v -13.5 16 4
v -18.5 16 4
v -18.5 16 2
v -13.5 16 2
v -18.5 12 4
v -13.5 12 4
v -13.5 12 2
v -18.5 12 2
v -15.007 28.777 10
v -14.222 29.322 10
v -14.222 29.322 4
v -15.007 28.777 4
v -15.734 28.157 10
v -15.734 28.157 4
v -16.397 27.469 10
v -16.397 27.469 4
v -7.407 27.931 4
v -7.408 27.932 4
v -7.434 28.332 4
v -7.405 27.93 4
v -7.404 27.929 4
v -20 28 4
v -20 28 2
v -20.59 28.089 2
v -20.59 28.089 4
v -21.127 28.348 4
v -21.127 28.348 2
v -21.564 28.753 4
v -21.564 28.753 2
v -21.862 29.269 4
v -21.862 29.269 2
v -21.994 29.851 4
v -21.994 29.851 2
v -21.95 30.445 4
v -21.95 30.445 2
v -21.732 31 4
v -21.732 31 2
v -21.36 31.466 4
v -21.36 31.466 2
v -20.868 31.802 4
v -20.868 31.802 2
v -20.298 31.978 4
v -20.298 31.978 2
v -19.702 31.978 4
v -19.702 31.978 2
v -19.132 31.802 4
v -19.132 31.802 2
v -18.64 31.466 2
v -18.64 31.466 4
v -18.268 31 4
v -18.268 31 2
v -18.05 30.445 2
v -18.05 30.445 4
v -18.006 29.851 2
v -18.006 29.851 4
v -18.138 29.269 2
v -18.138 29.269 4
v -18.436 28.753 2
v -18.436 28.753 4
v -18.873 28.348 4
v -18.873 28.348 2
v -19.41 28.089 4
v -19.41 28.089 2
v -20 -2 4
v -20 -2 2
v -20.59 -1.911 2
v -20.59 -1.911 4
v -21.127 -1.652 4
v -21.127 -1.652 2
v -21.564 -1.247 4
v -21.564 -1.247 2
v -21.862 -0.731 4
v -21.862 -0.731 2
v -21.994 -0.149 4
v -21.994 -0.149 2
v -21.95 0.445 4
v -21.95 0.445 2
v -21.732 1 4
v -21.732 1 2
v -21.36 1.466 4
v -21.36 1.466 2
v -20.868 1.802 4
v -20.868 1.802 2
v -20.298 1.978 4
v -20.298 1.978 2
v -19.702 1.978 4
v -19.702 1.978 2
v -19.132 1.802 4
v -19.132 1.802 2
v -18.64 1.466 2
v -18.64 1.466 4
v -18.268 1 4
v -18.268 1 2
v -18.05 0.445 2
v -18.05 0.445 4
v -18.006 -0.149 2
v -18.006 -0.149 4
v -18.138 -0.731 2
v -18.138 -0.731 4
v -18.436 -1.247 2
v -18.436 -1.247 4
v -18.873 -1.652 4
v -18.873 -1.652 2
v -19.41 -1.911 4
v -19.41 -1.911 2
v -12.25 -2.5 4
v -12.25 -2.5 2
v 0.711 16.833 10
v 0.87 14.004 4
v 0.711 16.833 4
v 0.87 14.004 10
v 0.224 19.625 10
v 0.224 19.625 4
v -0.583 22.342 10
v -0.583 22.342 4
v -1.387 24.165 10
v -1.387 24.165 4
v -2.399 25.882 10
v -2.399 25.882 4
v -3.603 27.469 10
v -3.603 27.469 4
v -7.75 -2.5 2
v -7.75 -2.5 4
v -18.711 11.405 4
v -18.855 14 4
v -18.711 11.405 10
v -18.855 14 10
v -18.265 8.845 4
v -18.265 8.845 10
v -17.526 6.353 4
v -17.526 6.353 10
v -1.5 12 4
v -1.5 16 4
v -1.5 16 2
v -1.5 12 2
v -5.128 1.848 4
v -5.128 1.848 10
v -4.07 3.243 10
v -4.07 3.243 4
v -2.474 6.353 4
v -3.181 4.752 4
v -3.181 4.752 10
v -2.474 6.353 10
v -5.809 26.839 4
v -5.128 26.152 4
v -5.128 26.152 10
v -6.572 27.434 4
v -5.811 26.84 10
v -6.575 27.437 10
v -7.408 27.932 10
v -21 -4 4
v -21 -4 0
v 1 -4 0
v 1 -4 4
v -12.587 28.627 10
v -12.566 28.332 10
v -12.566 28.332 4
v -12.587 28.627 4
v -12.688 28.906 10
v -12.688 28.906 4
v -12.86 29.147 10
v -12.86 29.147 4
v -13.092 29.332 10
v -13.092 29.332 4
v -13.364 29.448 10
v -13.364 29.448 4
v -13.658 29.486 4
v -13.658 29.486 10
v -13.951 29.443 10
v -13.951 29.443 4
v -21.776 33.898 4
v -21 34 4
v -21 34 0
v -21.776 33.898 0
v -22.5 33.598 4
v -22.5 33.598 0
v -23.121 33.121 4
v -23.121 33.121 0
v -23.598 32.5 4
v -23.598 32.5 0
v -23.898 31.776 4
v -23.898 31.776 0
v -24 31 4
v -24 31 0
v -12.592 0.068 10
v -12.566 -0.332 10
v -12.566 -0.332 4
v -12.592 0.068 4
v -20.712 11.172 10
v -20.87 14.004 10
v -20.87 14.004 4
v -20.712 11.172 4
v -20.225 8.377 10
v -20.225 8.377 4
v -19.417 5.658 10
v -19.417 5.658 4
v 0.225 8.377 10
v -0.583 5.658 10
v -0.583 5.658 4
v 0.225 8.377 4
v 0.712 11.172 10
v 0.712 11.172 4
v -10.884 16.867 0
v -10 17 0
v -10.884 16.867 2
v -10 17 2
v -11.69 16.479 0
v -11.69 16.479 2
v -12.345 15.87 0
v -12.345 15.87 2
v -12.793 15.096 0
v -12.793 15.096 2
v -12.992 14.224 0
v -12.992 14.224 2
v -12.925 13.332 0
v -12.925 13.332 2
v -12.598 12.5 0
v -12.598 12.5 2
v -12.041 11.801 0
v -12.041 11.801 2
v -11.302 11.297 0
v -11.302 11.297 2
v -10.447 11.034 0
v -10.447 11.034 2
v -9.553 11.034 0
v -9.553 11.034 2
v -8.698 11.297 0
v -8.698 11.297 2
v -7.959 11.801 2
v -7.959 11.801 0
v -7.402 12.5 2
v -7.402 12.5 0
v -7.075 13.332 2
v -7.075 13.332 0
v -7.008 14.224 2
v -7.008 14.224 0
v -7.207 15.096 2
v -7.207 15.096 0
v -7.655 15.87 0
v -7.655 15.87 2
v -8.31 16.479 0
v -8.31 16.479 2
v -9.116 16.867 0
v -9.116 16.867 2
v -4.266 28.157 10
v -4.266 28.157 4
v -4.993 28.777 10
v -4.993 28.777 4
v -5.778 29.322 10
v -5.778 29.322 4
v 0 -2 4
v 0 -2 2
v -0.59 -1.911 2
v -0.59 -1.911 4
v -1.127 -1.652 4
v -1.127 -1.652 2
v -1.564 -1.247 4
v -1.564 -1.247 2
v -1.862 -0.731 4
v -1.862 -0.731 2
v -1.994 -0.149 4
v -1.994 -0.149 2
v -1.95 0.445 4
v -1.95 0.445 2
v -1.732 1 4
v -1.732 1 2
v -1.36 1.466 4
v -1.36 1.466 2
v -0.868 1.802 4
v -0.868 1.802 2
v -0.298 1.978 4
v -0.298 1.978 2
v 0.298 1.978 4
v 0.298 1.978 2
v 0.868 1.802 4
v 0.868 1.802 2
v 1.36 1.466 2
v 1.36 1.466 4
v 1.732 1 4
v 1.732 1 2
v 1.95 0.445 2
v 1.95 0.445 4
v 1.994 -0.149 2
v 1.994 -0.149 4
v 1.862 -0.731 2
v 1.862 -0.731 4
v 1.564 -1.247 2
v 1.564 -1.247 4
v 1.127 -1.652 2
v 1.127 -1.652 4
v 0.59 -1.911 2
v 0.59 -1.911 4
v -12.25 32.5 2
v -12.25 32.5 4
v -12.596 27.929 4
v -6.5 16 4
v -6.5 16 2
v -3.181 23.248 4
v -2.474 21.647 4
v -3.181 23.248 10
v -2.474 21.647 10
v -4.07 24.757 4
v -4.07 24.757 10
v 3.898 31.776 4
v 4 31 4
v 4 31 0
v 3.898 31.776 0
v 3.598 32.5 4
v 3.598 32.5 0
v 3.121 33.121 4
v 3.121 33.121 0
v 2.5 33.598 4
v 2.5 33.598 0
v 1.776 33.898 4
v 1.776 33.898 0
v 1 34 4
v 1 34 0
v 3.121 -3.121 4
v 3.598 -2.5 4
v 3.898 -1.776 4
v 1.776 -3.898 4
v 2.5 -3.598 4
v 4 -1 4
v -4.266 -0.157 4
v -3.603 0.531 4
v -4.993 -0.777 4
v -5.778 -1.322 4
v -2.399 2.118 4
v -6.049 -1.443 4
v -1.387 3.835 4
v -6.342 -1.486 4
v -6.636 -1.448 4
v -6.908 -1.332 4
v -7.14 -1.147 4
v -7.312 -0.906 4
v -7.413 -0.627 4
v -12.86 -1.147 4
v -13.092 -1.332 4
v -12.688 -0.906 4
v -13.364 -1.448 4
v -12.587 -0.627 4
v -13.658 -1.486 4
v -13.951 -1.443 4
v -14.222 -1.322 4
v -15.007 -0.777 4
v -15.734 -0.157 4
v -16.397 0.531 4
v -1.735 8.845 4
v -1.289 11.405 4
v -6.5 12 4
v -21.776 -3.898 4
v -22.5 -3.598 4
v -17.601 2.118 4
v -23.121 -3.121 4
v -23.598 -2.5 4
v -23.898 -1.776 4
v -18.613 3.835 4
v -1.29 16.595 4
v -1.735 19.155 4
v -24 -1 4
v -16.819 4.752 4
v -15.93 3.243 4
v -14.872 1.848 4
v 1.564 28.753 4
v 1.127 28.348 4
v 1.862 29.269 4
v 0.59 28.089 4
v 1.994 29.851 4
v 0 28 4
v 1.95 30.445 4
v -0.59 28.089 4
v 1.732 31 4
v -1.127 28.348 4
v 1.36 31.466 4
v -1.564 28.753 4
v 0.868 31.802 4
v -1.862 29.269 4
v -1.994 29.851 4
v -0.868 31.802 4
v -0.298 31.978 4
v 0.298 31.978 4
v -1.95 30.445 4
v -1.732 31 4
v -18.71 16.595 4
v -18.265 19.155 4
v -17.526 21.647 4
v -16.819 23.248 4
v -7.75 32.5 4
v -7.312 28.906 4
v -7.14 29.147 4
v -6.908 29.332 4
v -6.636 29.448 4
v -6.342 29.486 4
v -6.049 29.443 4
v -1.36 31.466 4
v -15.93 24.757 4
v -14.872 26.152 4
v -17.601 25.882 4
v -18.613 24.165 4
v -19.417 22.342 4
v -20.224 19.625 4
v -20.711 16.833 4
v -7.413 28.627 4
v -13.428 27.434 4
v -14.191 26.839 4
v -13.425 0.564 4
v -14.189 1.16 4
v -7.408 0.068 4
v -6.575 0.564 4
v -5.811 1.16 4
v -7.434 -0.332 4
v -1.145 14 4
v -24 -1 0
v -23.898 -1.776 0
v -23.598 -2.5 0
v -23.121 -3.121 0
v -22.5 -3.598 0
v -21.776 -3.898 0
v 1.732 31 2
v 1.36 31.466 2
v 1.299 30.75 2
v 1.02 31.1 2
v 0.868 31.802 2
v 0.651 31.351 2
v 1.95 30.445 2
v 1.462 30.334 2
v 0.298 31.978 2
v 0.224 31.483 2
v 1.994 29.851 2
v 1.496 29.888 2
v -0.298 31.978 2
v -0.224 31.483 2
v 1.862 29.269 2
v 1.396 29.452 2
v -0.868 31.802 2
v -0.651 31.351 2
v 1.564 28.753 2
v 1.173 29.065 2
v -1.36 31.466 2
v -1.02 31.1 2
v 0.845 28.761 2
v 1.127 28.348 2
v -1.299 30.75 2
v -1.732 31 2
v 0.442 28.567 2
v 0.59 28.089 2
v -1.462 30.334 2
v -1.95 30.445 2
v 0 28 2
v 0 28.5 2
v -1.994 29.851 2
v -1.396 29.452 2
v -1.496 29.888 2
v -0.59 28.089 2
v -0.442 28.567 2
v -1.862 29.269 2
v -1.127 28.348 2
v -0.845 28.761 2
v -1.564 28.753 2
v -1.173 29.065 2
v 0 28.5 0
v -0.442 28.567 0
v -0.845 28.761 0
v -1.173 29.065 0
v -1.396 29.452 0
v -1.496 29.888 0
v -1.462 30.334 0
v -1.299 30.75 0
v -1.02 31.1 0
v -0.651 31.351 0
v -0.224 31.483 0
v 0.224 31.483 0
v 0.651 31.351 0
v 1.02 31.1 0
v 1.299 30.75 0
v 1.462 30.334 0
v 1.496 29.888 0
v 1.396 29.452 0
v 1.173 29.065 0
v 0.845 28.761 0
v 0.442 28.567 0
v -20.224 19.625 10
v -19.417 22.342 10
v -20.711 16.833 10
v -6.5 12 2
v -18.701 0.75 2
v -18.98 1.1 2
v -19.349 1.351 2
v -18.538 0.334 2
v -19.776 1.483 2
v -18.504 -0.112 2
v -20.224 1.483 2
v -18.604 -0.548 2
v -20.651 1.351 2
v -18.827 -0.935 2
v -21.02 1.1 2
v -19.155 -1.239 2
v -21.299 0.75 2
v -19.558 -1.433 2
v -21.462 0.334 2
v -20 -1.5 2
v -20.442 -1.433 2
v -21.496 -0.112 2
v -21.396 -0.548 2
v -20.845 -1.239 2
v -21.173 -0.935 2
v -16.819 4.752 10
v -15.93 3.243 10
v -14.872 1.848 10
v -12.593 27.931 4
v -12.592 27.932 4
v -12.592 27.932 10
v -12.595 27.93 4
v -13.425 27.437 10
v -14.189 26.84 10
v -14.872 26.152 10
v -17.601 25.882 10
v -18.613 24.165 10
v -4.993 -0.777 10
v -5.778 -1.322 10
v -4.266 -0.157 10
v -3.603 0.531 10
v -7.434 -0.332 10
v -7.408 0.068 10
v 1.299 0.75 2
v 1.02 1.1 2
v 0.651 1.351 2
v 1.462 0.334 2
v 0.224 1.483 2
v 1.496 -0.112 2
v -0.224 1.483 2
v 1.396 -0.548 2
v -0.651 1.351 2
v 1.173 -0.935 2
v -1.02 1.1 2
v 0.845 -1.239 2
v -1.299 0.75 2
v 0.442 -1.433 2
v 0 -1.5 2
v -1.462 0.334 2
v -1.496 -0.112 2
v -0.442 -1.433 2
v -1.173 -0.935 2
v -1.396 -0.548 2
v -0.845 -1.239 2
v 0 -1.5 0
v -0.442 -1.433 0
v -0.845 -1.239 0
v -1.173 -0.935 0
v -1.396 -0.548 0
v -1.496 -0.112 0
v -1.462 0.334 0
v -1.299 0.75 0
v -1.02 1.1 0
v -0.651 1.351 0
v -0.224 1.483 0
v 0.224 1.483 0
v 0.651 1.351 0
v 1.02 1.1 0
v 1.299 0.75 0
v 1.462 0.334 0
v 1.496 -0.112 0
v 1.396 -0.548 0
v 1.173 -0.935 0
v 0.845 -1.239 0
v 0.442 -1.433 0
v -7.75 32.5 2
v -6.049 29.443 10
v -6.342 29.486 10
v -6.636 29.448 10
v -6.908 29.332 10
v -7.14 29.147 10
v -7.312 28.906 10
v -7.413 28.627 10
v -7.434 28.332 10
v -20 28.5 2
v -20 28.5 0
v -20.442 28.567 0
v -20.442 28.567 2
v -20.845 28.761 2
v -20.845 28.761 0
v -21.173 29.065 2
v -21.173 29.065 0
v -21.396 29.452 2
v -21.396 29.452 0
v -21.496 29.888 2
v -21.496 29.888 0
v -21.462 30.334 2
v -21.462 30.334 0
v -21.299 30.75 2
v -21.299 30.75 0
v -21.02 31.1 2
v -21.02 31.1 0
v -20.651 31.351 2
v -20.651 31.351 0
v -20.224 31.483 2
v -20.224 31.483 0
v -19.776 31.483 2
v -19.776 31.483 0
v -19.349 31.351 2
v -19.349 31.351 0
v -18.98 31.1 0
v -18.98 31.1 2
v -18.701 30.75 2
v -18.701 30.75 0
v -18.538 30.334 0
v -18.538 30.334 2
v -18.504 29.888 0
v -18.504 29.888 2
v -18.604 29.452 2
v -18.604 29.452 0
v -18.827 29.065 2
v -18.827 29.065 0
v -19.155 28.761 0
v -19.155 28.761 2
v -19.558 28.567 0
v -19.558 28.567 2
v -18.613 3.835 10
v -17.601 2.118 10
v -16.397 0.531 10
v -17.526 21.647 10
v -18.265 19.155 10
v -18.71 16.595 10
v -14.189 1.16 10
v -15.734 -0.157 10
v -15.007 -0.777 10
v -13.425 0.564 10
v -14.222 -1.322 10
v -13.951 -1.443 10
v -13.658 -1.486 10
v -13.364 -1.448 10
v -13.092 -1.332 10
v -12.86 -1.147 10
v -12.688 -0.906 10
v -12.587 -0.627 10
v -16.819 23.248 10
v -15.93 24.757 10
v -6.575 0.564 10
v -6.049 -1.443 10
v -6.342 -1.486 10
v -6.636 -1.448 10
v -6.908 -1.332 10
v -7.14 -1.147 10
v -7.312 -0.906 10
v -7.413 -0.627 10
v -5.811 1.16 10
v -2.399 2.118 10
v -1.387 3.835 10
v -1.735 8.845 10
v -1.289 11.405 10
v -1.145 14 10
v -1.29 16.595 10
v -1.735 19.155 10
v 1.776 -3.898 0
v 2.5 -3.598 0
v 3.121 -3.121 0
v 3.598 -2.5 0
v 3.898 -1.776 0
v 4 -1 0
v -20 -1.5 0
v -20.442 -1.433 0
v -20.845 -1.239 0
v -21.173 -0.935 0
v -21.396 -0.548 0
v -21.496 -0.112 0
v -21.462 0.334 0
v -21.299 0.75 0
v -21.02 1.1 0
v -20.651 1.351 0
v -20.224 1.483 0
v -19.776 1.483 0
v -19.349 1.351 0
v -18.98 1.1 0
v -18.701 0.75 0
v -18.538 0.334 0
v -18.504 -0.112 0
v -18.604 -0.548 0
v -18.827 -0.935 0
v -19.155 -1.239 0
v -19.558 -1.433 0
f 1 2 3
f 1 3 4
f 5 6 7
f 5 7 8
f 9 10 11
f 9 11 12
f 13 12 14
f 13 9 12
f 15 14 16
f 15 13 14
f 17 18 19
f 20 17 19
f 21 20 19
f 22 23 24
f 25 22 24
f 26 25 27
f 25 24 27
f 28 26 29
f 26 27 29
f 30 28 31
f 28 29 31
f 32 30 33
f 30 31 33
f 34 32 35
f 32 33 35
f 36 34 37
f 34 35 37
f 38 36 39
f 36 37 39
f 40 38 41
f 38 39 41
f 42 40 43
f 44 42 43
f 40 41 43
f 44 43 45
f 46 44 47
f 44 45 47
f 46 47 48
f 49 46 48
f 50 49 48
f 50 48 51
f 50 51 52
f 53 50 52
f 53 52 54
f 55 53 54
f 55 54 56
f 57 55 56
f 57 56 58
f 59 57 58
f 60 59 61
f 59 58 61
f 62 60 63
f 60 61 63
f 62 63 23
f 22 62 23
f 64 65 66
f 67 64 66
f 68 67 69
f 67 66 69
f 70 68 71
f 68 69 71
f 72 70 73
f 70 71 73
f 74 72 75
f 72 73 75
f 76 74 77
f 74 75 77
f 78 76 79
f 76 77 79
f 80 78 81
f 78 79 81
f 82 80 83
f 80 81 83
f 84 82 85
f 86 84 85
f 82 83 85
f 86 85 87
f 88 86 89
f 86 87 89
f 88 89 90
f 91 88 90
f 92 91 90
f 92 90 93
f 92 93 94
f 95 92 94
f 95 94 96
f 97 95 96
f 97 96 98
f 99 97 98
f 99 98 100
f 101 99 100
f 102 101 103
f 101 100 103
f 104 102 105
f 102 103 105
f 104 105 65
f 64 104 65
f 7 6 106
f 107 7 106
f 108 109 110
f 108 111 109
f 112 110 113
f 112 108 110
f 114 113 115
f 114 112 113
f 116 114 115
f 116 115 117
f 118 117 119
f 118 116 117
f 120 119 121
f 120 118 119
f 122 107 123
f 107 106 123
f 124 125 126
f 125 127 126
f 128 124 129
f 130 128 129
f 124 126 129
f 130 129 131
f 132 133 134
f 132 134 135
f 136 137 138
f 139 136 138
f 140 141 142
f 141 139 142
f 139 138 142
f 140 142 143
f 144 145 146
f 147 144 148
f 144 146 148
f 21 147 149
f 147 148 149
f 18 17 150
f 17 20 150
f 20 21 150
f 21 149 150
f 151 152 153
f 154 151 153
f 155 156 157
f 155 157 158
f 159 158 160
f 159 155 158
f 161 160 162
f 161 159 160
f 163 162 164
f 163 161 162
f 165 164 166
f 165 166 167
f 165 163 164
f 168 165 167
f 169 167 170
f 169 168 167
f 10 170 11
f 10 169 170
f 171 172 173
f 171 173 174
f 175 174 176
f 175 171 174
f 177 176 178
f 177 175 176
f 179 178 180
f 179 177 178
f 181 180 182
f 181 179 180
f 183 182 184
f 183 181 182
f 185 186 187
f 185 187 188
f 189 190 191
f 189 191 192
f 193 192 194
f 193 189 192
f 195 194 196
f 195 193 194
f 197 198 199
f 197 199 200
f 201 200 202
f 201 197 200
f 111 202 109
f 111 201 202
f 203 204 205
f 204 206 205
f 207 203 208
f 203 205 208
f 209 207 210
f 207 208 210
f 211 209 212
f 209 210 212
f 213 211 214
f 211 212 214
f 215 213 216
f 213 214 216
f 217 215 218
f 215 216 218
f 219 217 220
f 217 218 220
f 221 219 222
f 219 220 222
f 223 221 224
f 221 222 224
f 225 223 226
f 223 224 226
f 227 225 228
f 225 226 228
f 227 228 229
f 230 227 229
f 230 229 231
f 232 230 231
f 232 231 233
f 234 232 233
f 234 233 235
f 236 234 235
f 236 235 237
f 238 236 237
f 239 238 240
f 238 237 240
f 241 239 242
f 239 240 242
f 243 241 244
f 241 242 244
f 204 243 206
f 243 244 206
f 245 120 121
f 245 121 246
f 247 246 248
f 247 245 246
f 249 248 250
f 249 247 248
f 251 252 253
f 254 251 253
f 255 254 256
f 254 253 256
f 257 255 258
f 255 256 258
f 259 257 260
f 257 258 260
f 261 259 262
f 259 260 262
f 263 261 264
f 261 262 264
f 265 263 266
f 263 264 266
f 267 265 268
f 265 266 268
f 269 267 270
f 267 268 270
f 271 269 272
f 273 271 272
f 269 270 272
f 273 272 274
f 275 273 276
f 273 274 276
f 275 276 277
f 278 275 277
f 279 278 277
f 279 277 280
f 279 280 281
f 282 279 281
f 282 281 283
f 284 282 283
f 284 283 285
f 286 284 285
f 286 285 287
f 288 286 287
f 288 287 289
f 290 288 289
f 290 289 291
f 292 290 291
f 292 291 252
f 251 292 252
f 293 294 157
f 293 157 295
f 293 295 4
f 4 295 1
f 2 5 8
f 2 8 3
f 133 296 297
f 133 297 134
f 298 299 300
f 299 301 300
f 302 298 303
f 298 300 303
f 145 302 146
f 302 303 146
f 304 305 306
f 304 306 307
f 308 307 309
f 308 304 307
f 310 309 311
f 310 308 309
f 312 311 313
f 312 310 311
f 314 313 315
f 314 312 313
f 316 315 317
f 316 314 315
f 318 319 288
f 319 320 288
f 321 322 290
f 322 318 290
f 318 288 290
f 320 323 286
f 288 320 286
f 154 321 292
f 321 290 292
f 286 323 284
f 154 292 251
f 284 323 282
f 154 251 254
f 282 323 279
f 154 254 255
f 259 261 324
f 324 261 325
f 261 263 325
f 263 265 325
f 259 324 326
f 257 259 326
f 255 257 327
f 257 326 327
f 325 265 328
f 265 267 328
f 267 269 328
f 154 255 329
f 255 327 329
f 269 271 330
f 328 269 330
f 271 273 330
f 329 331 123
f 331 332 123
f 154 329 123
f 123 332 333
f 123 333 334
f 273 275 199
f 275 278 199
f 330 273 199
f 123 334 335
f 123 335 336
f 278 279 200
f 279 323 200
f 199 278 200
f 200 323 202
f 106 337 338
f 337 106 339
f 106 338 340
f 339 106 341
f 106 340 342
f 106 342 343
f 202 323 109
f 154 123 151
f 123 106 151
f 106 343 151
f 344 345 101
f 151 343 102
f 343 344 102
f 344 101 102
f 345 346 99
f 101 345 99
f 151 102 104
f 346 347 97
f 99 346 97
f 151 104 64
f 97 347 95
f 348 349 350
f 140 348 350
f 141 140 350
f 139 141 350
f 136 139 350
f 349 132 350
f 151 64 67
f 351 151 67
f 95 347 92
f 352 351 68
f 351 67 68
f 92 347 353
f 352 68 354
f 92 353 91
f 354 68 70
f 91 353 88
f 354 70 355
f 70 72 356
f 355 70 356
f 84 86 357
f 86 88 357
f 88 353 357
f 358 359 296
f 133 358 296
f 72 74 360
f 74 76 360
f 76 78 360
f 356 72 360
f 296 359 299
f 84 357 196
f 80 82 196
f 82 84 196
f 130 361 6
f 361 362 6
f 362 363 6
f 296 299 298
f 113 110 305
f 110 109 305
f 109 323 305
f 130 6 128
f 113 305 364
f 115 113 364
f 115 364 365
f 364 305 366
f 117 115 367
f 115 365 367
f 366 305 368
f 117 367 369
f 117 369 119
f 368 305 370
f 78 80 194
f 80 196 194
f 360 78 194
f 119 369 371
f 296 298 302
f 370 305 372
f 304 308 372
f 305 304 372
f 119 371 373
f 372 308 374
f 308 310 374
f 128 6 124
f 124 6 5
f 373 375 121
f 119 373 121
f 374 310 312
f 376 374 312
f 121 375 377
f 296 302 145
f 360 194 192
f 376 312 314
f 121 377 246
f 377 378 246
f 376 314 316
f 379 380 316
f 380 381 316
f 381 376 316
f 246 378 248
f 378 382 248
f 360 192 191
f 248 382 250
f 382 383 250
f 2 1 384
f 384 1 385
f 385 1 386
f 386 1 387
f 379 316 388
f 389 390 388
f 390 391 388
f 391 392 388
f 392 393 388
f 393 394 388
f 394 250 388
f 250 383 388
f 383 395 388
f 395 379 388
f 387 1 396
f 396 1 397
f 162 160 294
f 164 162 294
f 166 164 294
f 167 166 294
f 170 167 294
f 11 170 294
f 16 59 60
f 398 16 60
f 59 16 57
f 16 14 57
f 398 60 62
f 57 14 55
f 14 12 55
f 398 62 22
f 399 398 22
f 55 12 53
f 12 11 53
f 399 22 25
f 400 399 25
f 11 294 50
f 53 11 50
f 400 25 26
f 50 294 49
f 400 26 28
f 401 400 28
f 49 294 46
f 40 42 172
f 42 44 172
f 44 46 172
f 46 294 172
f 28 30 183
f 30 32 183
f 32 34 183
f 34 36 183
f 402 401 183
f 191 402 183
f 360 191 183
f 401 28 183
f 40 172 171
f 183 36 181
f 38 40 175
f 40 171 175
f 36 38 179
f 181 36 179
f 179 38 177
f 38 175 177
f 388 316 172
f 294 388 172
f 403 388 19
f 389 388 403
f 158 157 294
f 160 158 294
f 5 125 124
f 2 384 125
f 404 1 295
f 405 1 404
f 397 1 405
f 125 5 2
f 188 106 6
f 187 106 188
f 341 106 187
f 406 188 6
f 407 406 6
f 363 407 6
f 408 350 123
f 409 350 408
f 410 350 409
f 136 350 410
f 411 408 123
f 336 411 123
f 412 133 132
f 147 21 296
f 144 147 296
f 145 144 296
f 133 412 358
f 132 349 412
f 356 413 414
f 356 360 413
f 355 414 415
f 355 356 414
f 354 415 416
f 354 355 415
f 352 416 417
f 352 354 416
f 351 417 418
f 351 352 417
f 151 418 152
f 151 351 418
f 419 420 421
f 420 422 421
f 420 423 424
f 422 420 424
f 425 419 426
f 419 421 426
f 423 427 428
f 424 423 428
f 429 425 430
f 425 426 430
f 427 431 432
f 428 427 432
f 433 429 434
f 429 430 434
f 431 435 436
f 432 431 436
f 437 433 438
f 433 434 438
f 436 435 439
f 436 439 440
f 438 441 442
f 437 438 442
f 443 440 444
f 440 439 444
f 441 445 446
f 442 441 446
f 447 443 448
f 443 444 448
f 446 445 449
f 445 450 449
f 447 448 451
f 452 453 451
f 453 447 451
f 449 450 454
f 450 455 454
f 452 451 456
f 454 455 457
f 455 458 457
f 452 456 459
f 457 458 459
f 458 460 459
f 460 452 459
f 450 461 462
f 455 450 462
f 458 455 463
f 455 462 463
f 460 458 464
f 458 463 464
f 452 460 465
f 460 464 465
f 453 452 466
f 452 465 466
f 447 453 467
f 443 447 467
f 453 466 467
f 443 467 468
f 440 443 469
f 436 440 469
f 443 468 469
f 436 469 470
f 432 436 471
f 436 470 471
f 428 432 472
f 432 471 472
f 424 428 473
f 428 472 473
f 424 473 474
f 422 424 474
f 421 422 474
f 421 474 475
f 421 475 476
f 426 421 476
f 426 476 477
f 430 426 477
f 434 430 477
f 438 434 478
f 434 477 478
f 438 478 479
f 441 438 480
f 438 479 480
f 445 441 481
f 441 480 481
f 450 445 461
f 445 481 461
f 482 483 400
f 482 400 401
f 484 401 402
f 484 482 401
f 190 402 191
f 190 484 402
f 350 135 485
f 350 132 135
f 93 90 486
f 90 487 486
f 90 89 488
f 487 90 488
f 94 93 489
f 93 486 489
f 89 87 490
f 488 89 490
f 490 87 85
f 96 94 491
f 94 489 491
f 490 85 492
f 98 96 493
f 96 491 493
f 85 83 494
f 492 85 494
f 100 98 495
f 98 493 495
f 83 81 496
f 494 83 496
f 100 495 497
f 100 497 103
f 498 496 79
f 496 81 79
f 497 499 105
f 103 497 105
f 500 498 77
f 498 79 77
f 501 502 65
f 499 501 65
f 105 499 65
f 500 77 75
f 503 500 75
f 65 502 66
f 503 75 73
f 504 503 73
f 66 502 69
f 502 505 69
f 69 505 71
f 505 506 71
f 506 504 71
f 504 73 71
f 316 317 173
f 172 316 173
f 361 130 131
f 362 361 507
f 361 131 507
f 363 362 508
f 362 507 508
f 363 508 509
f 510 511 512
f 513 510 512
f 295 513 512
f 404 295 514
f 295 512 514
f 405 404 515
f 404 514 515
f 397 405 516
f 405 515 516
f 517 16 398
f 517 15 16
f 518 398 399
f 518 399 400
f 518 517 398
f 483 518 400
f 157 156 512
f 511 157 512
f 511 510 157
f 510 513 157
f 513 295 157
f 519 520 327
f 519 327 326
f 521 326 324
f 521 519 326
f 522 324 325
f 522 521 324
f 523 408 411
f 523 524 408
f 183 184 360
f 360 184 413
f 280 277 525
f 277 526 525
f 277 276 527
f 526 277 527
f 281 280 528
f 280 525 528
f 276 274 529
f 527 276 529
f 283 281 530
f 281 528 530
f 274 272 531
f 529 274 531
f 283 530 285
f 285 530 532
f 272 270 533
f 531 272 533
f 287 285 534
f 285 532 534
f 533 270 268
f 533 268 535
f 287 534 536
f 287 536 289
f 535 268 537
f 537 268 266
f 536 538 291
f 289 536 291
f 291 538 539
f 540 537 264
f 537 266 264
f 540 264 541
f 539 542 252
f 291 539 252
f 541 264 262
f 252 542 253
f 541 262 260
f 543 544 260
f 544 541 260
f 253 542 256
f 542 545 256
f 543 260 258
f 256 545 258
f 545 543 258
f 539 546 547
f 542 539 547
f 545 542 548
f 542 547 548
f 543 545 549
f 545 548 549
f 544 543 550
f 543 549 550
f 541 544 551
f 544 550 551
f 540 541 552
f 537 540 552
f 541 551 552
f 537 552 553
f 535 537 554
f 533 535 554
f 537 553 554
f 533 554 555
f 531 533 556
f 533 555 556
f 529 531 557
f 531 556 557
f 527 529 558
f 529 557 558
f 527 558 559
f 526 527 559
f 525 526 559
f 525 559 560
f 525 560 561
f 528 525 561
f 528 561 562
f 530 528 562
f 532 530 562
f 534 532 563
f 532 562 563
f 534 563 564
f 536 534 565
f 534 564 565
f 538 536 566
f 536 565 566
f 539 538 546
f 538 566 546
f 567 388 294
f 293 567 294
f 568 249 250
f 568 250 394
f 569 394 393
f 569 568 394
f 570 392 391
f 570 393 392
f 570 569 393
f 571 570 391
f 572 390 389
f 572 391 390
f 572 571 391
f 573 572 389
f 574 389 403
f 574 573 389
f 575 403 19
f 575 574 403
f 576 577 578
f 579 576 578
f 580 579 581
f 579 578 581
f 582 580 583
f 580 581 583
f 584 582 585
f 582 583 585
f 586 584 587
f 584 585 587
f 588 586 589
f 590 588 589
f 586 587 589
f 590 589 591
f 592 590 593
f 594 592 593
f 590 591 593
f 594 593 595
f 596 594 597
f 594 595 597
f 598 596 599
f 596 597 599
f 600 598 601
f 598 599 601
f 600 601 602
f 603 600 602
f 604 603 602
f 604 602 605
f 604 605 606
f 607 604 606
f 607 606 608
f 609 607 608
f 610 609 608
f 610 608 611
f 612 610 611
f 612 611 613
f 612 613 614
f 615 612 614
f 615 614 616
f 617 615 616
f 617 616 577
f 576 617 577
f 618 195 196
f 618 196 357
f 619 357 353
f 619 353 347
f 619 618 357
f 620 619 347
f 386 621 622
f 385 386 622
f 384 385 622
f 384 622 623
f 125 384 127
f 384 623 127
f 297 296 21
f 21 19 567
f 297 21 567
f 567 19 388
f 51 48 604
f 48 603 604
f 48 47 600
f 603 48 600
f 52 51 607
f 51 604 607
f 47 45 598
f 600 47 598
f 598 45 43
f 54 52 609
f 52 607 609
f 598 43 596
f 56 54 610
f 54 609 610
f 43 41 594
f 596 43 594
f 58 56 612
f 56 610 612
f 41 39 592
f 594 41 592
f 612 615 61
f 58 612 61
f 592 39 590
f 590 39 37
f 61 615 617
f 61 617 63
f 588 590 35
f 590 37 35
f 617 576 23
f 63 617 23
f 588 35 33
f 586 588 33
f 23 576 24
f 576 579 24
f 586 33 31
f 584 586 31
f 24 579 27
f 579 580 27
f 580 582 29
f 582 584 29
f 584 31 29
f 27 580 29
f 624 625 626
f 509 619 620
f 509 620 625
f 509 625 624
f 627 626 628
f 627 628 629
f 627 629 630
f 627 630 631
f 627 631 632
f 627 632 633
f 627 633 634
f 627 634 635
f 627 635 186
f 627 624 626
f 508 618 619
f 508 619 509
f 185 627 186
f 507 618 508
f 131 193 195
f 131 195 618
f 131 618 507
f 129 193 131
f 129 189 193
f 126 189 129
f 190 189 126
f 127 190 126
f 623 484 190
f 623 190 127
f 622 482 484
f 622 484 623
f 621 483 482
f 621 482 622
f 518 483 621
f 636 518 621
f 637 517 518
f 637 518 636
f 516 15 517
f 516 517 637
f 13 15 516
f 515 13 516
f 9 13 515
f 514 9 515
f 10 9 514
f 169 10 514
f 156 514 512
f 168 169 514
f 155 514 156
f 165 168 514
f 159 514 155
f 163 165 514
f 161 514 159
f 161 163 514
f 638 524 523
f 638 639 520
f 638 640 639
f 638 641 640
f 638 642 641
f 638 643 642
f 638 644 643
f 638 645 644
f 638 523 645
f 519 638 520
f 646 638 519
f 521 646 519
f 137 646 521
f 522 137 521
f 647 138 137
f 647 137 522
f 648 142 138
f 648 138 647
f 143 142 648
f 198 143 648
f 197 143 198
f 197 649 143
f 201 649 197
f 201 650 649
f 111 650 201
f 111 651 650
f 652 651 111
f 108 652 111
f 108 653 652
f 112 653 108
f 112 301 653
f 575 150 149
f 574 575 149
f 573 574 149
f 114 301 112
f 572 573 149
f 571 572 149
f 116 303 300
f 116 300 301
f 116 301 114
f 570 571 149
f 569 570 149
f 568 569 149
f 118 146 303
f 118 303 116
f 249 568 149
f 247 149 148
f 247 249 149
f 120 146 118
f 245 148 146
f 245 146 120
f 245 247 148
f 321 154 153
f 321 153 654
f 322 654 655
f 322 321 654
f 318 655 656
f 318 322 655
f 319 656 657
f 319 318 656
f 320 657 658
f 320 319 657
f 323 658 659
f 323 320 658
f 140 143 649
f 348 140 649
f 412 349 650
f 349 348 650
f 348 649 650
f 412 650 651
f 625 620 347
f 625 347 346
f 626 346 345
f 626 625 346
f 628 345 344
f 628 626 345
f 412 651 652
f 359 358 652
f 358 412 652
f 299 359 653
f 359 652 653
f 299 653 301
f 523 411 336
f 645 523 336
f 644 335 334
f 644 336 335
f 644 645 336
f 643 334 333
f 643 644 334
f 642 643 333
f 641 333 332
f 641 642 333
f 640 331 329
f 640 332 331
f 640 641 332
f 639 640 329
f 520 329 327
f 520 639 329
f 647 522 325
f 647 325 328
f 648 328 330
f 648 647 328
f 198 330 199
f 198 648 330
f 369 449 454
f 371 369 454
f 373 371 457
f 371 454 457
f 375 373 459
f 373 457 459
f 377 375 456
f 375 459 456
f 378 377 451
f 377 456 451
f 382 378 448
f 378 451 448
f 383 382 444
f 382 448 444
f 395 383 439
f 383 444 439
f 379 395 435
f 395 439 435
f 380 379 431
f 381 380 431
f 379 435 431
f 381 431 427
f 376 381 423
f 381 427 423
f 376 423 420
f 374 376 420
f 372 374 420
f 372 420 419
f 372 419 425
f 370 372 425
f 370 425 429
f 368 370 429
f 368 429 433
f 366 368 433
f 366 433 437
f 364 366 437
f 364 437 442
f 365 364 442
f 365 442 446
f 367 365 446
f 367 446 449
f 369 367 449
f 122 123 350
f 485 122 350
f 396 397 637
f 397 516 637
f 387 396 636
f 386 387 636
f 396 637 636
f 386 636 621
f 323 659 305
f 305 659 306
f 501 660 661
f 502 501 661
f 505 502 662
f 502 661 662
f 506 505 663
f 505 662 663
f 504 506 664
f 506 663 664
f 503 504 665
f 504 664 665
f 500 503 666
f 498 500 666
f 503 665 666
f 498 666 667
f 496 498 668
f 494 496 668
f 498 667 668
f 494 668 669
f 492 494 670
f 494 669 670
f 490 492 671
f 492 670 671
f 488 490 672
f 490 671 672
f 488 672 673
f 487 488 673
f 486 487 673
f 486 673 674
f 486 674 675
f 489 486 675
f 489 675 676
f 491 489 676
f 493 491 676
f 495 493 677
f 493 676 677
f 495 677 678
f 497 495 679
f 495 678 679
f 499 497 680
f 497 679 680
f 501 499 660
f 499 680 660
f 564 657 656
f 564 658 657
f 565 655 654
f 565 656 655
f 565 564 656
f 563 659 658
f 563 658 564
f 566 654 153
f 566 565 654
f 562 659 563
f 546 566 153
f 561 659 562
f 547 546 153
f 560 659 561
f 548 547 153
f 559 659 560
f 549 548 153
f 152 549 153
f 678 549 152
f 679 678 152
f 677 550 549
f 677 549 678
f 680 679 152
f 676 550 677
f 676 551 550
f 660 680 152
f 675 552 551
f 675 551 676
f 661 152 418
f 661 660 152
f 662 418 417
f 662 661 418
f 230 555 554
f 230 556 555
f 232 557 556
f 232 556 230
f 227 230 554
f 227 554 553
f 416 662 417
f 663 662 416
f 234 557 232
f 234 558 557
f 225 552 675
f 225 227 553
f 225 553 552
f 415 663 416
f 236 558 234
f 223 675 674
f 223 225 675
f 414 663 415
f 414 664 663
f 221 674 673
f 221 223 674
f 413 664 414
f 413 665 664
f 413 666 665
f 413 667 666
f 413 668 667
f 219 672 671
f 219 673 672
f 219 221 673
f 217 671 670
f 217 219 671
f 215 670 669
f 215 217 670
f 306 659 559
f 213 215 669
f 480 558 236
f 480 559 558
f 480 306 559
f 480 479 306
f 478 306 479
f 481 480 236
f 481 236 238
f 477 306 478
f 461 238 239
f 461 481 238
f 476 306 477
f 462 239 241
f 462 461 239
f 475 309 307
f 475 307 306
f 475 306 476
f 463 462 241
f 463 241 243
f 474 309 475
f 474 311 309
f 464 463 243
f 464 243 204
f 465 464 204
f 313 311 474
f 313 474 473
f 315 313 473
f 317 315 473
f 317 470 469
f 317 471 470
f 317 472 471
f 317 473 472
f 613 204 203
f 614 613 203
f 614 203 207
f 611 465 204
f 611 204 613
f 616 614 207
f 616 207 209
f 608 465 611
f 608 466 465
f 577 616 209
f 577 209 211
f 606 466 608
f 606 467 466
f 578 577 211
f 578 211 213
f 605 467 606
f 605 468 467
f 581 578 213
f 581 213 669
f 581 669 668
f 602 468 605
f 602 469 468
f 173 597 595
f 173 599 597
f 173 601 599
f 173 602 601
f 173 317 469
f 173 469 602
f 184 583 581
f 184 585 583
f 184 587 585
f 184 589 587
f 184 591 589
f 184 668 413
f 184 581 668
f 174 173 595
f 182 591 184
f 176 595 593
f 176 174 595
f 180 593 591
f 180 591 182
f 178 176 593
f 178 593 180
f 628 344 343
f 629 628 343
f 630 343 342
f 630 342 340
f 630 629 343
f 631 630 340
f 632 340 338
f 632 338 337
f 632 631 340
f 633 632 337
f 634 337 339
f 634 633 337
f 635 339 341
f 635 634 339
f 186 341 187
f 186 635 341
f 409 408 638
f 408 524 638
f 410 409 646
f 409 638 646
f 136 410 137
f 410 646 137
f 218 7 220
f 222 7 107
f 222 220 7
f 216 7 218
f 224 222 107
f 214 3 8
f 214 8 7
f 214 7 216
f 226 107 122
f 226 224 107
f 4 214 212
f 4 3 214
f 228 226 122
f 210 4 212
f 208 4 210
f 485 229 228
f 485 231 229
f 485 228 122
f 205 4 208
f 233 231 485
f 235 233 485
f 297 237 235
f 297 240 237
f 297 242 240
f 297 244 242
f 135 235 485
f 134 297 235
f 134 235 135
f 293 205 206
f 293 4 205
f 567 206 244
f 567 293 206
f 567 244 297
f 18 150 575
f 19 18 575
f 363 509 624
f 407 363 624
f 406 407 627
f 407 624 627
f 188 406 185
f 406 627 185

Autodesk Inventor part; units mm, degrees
ref_plane "YZ Plane" through (0, 0, 0) normal (1, 0, 0) x (0, 1, 0)
ref_plane "XZ Plane" through (0, 0, 0) normal (0, 1, 0) x (-1, 0, 0)
sketch "Boceto5" plane through (-24, -1, 0) normal (0, 0, -1) x (-1, 0, 0)
  line L0 (-28, 35) -> (0, 35)
  line L1 (0, 35) -> (0, -3)
  line L2 (0, -3) -> (-28, -3)
  line L3 (-28, -3) -> (-28, 35)
  point P0 (-24, 1)
  point P1 (0, 0)
  dimension "d3" = 28
  dimension "d4" = 3
  dimension "d5" = 35
extrude "Extrusión2" add sketch "Boceto5" against normal blind 4
fillet "Empalme1" radius 3 4 edges at (-24, -4, 2) (4, -4, 2) (4, 34, 2) (-24, 34, 2)
sketch "Boceto6" plane through (-24, -1, 4) normal (0, 0, 1) x (1, 0, 0)
  line L0 (25, 35) -> (3, 35) construction
  line L1 (0, 32) -> (0, 0) construction
  point P0 (24, 1)
  point P1 (4, 31)
  dimension "d9" = 4
  dimension "d10" = 4
hole "Agujero1" at (-20, 30, 4) direction (0, 0, -1) diameter 3 end through all counterbore diameter 4 counterbore depth 2
pattern_linear "Patrón rectangular1" count 2 spacing 20 along (1, 0, 0) count 2 spacing 30 along (0, -1, 0) of "Agujero1"
sketch "Boceto7" plane through (-24, -1, 0) normal (0, 0, -1) x (-1, 0, 0)
  line L0 (-3, 35) -> (-25, 35) projected
  line L1 (-28, 32) -> (-28, 0) projected
  point P0 (-24, 1)
  point P1 (-14, 15)
  dimension "d24" = 20
  dimension "d25" = 14
hole "Agujero2" at (-10, 14, 0) direction (0, 0, 1) diameter 6 end through all
sketch "Boceto8" plane through (-24, -1, 4) normal (0, 0, 1) x (1, 0, 0)
  line L0 (5.5, 17) -> (22.5, 17)
  line L1 (22.5, 17) -> (22.5, 13)
  line L2 (22.5, 13) -> (5.5, 13)
  line L3 (5.5, 13) -> (5.5, 17)
  circle A0 centre (14, 15) radius 3 projected
  line L4 (5.5, 17) -> (22.5, 13) construction
  line L5 (22.5, 17) -> (5.5, 13) construction
  point P0 (24, 1)
  point P1 (11.7639, 13)
  point P2 (11.7639, 17)
  point P3 (16.2361, 17)
  point P4 (16.2361, 13)
  dimension "d33" = 17
  dimension "d34" = 4
extrude "Extrusión3" cut sketch "Boceto8" against normal blind 2 contours L0 A0 L2 L3 | L0 L1 L2 A0
sketch "Boceto9" plane through (-24, -1, 4) normal (0, 0, 1) x (1, 0, 0)
  line L0 (11.7639, 13) -> (5.5, 13) construction
  line L1 (10.5, 13) -> (11.75, -1.5)
  line L2 (11.75, -1.5) -> (16.25, -1.5)
  line L3 (16.25, -1.5) -> (17.5, 13)
  line L4 (17.5, 13) -> (10.5, 13)
  line L5 (0, 32) -> (0, 0) projected
  point P0 (24, 1)
  dimension "d37" = 14.5
  dimension "d38" = 4.5
  dimension "d39" = 10.5
  dimension "d40" = 7
  dimension "d41" = 1.25
extrude "Extrusión4" cut sketch "Boceto9" against normal blind 2
sketch "Boceto11" plane through (-24, -1, 4) normal (0, 0, 1) x (1, 0, 0)
  line L0 (5.5, 17) -> (11.7639, 17) construction
  line L1 (10.5, 17) -> (17.5, 17)
  line L2 (17.5, 17) -> (16.25, 33.5)
  line L3 (16.25, 33.5) -> (11.75, 33.5)
  line L4 (11.75, 33.5) -> (10.5, 17)
  point P0 (24, 1)
  dimension "d44" = 16.5
  dimension "d46" = 5
  dimension "d47" = 1.25
  dimension "d48" = 7
extrude "Extrusión5" cut sketch "Boceto11" against normal blind 2
sketch "Boceto15" plane through (-13.8306, 0.9703, 10) normal (0, 0, 1) x (1, 0, 0)
  circle A0 centre (17.3236, 13.0832) radius 22.3484 construction
  circle A1 centre (4.7289, 20.1353) radius 7.5795 construction
  circle A2 centre (10.4075, 15.4052) radius 15.0152 construction
  arc A3 (-3.6953, 20.6765) -> (-5.0248, 13.0297) centre (17.3236, 13.0832) ccw
  arc A4 (-1.0419, 25.1821) -> (-3.6953, 20.6765) centre (10.4075, 15.4052) ccw
  arc A5 (1.2391, 26.9612) -> (-1.0419, 25.1821) centre (4.7289, 20.1353) ccw
  circle A6 centre (3.8306, 13.0297) radius 3 construction
  line L0 (3.8306, 13.0297) -> (-5.0248, 13.0297) construction
  line L1 (3.8306, 11.0151) -> (-6.9515, 11.0151) construction
  arc A7 (-5.5863, 21.3713) -> (-6.9515, 11.0151) centre (17.3236, 13.0832) ccw
  arc A8 (-2.5664, 26.4991) -> (-5.5863, 21.3713) centre (10.4075, 15.4052) ccw
  arc A9 (-0.3913, 28.3513) -> (-2.5664, 26.4991) centre (4.7289, 20.1353) ccw
  line L2 (0.3306, 15.0297) -> (1.5806, 31.5297) construction
  arc A10 (1.2648, 27.3612) -> (-0.3913, 28.3513) centre (0.1824, 27.4308) ccw
  line L3 (1.2648, 27.3612) -> (1.2391, 26.9612)
  arc A11 (-5.0248, 13.0297) -> (-3.6953, 5.3829) centre (17.3236, 12.9762) ccw
  arc A12 (-3.6953, 5.3829) -> (-1.0419, 0.8774) centre (10.4075, 10.6542) ccw
  arc A13 (-1.0419, 0.8774) -> (1.2391, -0.9018) centre (4.7289, 5.9242) ccw
  line L4 (3.8306, 15.0443) -> (-6.9515, 15.0443) construction
  arc A14 (-6.9515, 15.0443) -> (-5.5863, 4.6881) centre (17.3236, 12.9762) ccw
  arc A15 (-5.5863, 4.6881) -> (-2.5664, -0.4397) centre (10.4075, 10.6542) ccw
  arc A16 (-2.5664, -0.4397) -> (-0.3913, -2.2919) centre (4.7289, 5.9242) ccw
  arc A17 (-0.3913, -2.2919) -> (1.2648, -1.3018) centre (0.1824, -1.3713) ccw
  line L5 (1.2648, -1.3018) -> (1.2391, -0.9018)
  point P0 (13.8306, -0.9703)
  point P1 (0.3306, 11.0297)
  point P2 (-7.0394, 13.0297)
  dimension "d51" = 20
  dimension "d52" = 20
  dimension "d53" = 21.75
  dimension "d55" = 1.9267
  dimension "d56" = 0.4
extrude "Extrusión6" add sketch "Boceto15" against normal blind 6
ref_plane "Plano de trabajo2" through (-10, 12, 4) normal (1, 0, 0) x (0, 0, -1)
mirror "Simetría2" about plane through (-10, 12, 4) normal (1, 0, 0) of "Extrusión6"
properties part number "base"
